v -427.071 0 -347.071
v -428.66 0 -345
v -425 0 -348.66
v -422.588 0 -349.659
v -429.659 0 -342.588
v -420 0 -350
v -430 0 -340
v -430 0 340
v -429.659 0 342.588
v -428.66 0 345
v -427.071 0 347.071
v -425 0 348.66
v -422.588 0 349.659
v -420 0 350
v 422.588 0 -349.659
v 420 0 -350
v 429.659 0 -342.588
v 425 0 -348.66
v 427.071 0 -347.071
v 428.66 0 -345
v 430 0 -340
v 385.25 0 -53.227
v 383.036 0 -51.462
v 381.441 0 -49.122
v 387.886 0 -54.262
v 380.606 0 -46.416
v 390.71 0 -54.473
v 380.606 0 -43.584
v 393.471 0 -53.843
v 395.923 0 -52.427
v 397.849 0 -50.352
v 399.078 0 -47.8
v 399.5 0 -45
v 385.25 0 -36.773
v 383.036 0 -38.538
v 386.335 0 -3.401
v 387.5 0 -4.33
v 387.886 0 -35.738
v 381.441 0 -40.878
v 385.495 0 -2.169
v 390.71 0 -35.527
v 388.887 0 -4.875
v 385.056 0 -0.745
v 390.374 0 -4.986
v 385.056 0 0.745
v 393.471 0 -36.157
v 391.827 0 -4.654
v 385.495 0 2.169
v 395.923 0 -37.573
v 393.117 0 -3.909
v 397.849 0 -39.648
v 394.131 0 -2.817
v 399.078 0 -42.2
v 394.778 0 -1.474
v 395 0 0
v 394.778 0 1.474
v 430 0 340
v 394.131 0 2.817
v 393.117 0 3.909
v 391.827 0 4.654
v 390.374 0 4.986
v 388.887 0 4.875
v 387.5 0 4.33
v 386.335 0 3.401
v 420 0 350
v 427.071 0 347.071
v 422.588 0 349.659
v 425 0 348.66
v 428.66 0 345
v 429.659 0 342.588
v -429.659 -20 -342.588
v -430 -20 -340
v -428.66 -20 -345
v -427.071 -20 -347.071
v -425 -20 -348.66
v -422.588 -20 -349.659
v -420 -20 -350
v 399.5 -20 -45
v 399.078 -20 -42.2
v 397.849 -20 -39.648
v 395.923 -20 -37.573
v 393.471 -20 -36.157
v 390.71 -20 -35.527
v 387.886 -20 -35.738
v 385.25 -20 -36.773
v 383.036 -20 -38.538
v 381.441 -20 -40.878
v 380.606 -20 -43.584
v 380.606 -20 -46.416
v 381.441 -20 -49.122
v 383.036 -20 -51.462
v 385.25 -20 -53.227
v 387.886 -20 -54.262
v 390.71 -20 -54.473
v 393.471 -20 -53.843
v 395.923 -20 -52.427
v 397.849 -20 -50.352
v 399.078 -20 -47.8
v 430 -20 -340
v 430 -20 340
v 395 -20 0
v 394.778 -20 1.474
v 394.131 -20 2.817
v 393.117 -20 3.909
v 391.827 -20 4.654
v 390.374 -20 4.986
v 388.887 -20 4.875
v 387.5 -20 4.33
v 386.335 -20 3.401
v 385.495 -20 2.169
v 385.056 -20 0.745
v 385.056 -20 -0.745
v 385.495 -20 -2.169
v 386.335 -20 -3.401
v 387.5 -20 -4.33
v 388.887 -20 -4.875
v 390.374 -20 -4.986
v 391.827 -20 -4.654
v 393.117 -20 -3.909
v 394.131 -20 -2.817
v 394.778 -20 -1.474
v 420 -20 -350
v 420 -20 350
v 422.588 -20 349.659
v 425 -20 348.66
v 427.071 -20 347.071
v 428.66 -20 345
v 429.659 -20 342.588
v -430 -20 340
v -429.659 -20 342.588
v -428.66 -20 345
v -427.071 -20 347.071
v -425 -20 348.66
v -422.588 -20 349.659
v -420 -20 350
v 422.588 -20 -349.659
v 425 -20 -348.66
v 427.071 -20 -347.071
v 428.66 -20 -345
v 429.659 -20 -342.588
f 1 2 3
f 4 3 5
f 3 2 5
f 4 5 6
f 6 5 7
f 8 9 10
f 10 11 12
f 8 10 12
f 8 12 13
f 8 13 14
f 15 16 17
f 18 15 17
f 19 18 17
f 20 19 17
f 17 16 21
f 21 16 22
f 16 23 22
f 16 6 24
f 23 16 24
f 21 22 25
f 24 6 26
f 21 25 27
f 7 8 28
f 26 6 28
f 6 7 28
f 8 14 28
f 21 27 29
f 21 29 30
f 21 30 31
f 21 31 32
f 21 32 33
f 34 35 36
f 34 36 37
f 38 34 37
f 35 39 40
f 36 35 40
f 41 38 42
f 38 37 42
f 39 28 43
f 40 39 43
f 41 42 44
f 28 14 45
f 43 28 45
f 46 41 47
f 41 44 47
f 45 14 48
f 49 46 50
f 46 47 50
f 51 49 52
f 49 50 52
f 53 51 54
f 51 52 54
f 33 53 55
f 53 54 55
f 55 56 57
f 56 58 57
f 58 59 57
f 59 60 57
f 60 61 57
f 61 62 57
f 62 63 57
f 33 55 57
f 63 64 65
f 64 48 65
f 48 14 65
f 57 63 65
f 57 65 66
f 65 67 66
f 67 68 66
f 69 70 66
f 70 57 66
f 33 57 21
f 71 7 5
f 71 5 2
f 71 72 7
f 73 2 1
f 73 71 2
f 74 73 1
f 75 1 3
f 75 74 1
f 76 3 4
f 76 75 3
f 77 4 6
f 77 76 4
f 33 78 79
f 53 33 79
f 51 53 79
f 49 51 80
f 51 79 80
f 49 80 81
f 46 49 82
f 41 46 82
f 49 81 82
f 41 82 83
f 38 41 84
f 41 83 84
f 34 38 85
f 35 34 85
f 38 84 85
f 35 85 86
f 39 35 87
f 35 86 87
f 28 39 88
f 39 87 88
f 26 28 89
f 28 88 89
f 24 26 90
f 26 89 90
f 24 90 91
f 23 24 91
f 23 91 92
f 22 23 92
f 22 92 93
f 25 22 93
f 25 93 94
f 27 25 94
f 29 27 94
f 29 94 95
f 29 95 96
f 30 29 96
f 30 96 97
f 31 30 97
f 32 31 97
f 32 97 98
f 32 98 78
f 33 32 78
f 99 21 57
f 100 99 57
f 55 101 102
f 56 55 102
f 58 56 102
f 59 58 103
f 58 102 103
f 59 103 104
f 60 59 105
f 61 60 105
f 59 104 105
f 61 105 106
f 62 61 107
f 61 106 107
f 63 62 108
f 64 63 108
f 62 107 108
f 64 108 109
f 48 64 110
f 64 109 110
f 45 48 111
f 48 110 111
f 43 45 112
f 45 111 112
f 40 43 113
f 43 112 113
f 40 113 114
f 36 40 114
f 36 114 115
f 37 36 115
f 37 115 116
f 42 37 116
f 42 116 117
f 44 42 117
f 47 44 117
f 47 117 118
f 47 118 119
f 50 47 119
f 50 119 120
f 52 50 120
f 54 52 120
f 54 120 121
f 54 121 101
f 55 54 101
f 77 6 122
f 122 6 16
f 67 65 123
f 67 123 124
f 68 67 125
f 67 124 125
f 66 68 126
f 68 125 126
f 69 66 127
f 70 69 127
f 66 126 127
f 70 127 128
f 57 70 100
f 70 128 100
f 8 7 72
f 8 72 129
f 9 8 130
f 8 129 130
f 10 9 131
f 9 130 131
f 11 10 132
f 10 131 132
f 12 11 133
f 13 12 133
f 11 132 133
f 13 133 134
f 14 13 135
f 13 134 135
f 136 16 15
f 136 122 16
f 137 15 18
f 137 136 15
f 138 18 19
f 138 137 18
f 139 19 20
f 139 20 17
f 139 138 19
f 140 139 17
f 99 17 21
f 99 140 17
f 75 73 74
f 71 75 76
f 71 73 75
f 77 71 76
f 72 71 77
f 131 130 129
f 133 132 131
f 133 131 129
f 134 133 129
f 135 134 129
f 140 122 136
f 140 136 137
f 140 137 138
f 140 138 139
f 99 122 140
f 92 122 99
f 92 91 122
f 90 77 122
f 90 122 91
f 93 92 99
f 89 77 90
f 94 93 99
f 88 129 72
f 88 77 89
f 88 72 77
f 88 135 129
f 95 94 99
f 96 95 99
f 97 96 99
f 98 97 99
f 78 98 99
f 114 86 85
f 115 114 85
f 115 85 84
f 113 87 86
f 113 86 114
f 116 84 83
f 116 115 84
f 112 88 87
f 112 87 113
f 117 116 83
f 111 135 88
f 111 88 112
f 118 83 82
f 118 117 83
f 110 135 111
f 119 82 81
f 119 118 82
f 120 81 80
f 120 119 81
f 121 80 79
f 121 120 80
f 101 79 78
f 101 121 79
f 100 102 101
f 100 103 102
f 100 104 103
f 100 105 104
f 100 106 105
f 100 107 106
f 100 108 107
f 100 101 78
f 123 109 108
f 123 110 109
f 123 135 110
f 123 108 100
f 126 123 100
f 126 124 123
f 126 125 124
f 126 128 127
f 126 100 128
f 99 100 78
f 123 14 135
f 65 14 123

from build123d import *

# Parameters (mm, degrees)
F0_W     = 860
F0_H     = 700
F1_DEPTH = 20
F2_R     = 5
F3_DEPTH = 20.001
F4_R     = 9.5
F5_DEPTH = 20.001
F6_R     = 10


with BuildPart() as f1:
    # F0 (on Front) → F1 (new body)
    with BuildSketch(Plane.XZ):
        Rectangle(F0_W, F0_H)
    extrude(amount=F1_DEPTH)

    # F2 (on face) → F3 (cut, through all)
    with BuildSketch(Plane.XZ.offset(20)):
        with Locations((390, 0)):
            Circle(F2_R)
    extrude(amount=-F3_DEPTH, mode=Mode.SUBTRACT)

    # F4 (on face) → F5 (cut, through all)
    with BuildSketch(Plane.XZ.offset(20)):
        with Locations((390, -45)):
            Circle(F4_R)
    extrude(amount=-F5_DEPTH, mode=Mode.SUBTRACT)

    # F6
    f6_edges = [f1.edges().sort_by_distance(p)[0] for p in [
        (430, -10, 350),
        (430, -10, -350),
        (-430, -10, 350),
        (-430, -10, -350),
    ]]
    fillet(f6_edges, radius=F6_R)


solid = f1.part
